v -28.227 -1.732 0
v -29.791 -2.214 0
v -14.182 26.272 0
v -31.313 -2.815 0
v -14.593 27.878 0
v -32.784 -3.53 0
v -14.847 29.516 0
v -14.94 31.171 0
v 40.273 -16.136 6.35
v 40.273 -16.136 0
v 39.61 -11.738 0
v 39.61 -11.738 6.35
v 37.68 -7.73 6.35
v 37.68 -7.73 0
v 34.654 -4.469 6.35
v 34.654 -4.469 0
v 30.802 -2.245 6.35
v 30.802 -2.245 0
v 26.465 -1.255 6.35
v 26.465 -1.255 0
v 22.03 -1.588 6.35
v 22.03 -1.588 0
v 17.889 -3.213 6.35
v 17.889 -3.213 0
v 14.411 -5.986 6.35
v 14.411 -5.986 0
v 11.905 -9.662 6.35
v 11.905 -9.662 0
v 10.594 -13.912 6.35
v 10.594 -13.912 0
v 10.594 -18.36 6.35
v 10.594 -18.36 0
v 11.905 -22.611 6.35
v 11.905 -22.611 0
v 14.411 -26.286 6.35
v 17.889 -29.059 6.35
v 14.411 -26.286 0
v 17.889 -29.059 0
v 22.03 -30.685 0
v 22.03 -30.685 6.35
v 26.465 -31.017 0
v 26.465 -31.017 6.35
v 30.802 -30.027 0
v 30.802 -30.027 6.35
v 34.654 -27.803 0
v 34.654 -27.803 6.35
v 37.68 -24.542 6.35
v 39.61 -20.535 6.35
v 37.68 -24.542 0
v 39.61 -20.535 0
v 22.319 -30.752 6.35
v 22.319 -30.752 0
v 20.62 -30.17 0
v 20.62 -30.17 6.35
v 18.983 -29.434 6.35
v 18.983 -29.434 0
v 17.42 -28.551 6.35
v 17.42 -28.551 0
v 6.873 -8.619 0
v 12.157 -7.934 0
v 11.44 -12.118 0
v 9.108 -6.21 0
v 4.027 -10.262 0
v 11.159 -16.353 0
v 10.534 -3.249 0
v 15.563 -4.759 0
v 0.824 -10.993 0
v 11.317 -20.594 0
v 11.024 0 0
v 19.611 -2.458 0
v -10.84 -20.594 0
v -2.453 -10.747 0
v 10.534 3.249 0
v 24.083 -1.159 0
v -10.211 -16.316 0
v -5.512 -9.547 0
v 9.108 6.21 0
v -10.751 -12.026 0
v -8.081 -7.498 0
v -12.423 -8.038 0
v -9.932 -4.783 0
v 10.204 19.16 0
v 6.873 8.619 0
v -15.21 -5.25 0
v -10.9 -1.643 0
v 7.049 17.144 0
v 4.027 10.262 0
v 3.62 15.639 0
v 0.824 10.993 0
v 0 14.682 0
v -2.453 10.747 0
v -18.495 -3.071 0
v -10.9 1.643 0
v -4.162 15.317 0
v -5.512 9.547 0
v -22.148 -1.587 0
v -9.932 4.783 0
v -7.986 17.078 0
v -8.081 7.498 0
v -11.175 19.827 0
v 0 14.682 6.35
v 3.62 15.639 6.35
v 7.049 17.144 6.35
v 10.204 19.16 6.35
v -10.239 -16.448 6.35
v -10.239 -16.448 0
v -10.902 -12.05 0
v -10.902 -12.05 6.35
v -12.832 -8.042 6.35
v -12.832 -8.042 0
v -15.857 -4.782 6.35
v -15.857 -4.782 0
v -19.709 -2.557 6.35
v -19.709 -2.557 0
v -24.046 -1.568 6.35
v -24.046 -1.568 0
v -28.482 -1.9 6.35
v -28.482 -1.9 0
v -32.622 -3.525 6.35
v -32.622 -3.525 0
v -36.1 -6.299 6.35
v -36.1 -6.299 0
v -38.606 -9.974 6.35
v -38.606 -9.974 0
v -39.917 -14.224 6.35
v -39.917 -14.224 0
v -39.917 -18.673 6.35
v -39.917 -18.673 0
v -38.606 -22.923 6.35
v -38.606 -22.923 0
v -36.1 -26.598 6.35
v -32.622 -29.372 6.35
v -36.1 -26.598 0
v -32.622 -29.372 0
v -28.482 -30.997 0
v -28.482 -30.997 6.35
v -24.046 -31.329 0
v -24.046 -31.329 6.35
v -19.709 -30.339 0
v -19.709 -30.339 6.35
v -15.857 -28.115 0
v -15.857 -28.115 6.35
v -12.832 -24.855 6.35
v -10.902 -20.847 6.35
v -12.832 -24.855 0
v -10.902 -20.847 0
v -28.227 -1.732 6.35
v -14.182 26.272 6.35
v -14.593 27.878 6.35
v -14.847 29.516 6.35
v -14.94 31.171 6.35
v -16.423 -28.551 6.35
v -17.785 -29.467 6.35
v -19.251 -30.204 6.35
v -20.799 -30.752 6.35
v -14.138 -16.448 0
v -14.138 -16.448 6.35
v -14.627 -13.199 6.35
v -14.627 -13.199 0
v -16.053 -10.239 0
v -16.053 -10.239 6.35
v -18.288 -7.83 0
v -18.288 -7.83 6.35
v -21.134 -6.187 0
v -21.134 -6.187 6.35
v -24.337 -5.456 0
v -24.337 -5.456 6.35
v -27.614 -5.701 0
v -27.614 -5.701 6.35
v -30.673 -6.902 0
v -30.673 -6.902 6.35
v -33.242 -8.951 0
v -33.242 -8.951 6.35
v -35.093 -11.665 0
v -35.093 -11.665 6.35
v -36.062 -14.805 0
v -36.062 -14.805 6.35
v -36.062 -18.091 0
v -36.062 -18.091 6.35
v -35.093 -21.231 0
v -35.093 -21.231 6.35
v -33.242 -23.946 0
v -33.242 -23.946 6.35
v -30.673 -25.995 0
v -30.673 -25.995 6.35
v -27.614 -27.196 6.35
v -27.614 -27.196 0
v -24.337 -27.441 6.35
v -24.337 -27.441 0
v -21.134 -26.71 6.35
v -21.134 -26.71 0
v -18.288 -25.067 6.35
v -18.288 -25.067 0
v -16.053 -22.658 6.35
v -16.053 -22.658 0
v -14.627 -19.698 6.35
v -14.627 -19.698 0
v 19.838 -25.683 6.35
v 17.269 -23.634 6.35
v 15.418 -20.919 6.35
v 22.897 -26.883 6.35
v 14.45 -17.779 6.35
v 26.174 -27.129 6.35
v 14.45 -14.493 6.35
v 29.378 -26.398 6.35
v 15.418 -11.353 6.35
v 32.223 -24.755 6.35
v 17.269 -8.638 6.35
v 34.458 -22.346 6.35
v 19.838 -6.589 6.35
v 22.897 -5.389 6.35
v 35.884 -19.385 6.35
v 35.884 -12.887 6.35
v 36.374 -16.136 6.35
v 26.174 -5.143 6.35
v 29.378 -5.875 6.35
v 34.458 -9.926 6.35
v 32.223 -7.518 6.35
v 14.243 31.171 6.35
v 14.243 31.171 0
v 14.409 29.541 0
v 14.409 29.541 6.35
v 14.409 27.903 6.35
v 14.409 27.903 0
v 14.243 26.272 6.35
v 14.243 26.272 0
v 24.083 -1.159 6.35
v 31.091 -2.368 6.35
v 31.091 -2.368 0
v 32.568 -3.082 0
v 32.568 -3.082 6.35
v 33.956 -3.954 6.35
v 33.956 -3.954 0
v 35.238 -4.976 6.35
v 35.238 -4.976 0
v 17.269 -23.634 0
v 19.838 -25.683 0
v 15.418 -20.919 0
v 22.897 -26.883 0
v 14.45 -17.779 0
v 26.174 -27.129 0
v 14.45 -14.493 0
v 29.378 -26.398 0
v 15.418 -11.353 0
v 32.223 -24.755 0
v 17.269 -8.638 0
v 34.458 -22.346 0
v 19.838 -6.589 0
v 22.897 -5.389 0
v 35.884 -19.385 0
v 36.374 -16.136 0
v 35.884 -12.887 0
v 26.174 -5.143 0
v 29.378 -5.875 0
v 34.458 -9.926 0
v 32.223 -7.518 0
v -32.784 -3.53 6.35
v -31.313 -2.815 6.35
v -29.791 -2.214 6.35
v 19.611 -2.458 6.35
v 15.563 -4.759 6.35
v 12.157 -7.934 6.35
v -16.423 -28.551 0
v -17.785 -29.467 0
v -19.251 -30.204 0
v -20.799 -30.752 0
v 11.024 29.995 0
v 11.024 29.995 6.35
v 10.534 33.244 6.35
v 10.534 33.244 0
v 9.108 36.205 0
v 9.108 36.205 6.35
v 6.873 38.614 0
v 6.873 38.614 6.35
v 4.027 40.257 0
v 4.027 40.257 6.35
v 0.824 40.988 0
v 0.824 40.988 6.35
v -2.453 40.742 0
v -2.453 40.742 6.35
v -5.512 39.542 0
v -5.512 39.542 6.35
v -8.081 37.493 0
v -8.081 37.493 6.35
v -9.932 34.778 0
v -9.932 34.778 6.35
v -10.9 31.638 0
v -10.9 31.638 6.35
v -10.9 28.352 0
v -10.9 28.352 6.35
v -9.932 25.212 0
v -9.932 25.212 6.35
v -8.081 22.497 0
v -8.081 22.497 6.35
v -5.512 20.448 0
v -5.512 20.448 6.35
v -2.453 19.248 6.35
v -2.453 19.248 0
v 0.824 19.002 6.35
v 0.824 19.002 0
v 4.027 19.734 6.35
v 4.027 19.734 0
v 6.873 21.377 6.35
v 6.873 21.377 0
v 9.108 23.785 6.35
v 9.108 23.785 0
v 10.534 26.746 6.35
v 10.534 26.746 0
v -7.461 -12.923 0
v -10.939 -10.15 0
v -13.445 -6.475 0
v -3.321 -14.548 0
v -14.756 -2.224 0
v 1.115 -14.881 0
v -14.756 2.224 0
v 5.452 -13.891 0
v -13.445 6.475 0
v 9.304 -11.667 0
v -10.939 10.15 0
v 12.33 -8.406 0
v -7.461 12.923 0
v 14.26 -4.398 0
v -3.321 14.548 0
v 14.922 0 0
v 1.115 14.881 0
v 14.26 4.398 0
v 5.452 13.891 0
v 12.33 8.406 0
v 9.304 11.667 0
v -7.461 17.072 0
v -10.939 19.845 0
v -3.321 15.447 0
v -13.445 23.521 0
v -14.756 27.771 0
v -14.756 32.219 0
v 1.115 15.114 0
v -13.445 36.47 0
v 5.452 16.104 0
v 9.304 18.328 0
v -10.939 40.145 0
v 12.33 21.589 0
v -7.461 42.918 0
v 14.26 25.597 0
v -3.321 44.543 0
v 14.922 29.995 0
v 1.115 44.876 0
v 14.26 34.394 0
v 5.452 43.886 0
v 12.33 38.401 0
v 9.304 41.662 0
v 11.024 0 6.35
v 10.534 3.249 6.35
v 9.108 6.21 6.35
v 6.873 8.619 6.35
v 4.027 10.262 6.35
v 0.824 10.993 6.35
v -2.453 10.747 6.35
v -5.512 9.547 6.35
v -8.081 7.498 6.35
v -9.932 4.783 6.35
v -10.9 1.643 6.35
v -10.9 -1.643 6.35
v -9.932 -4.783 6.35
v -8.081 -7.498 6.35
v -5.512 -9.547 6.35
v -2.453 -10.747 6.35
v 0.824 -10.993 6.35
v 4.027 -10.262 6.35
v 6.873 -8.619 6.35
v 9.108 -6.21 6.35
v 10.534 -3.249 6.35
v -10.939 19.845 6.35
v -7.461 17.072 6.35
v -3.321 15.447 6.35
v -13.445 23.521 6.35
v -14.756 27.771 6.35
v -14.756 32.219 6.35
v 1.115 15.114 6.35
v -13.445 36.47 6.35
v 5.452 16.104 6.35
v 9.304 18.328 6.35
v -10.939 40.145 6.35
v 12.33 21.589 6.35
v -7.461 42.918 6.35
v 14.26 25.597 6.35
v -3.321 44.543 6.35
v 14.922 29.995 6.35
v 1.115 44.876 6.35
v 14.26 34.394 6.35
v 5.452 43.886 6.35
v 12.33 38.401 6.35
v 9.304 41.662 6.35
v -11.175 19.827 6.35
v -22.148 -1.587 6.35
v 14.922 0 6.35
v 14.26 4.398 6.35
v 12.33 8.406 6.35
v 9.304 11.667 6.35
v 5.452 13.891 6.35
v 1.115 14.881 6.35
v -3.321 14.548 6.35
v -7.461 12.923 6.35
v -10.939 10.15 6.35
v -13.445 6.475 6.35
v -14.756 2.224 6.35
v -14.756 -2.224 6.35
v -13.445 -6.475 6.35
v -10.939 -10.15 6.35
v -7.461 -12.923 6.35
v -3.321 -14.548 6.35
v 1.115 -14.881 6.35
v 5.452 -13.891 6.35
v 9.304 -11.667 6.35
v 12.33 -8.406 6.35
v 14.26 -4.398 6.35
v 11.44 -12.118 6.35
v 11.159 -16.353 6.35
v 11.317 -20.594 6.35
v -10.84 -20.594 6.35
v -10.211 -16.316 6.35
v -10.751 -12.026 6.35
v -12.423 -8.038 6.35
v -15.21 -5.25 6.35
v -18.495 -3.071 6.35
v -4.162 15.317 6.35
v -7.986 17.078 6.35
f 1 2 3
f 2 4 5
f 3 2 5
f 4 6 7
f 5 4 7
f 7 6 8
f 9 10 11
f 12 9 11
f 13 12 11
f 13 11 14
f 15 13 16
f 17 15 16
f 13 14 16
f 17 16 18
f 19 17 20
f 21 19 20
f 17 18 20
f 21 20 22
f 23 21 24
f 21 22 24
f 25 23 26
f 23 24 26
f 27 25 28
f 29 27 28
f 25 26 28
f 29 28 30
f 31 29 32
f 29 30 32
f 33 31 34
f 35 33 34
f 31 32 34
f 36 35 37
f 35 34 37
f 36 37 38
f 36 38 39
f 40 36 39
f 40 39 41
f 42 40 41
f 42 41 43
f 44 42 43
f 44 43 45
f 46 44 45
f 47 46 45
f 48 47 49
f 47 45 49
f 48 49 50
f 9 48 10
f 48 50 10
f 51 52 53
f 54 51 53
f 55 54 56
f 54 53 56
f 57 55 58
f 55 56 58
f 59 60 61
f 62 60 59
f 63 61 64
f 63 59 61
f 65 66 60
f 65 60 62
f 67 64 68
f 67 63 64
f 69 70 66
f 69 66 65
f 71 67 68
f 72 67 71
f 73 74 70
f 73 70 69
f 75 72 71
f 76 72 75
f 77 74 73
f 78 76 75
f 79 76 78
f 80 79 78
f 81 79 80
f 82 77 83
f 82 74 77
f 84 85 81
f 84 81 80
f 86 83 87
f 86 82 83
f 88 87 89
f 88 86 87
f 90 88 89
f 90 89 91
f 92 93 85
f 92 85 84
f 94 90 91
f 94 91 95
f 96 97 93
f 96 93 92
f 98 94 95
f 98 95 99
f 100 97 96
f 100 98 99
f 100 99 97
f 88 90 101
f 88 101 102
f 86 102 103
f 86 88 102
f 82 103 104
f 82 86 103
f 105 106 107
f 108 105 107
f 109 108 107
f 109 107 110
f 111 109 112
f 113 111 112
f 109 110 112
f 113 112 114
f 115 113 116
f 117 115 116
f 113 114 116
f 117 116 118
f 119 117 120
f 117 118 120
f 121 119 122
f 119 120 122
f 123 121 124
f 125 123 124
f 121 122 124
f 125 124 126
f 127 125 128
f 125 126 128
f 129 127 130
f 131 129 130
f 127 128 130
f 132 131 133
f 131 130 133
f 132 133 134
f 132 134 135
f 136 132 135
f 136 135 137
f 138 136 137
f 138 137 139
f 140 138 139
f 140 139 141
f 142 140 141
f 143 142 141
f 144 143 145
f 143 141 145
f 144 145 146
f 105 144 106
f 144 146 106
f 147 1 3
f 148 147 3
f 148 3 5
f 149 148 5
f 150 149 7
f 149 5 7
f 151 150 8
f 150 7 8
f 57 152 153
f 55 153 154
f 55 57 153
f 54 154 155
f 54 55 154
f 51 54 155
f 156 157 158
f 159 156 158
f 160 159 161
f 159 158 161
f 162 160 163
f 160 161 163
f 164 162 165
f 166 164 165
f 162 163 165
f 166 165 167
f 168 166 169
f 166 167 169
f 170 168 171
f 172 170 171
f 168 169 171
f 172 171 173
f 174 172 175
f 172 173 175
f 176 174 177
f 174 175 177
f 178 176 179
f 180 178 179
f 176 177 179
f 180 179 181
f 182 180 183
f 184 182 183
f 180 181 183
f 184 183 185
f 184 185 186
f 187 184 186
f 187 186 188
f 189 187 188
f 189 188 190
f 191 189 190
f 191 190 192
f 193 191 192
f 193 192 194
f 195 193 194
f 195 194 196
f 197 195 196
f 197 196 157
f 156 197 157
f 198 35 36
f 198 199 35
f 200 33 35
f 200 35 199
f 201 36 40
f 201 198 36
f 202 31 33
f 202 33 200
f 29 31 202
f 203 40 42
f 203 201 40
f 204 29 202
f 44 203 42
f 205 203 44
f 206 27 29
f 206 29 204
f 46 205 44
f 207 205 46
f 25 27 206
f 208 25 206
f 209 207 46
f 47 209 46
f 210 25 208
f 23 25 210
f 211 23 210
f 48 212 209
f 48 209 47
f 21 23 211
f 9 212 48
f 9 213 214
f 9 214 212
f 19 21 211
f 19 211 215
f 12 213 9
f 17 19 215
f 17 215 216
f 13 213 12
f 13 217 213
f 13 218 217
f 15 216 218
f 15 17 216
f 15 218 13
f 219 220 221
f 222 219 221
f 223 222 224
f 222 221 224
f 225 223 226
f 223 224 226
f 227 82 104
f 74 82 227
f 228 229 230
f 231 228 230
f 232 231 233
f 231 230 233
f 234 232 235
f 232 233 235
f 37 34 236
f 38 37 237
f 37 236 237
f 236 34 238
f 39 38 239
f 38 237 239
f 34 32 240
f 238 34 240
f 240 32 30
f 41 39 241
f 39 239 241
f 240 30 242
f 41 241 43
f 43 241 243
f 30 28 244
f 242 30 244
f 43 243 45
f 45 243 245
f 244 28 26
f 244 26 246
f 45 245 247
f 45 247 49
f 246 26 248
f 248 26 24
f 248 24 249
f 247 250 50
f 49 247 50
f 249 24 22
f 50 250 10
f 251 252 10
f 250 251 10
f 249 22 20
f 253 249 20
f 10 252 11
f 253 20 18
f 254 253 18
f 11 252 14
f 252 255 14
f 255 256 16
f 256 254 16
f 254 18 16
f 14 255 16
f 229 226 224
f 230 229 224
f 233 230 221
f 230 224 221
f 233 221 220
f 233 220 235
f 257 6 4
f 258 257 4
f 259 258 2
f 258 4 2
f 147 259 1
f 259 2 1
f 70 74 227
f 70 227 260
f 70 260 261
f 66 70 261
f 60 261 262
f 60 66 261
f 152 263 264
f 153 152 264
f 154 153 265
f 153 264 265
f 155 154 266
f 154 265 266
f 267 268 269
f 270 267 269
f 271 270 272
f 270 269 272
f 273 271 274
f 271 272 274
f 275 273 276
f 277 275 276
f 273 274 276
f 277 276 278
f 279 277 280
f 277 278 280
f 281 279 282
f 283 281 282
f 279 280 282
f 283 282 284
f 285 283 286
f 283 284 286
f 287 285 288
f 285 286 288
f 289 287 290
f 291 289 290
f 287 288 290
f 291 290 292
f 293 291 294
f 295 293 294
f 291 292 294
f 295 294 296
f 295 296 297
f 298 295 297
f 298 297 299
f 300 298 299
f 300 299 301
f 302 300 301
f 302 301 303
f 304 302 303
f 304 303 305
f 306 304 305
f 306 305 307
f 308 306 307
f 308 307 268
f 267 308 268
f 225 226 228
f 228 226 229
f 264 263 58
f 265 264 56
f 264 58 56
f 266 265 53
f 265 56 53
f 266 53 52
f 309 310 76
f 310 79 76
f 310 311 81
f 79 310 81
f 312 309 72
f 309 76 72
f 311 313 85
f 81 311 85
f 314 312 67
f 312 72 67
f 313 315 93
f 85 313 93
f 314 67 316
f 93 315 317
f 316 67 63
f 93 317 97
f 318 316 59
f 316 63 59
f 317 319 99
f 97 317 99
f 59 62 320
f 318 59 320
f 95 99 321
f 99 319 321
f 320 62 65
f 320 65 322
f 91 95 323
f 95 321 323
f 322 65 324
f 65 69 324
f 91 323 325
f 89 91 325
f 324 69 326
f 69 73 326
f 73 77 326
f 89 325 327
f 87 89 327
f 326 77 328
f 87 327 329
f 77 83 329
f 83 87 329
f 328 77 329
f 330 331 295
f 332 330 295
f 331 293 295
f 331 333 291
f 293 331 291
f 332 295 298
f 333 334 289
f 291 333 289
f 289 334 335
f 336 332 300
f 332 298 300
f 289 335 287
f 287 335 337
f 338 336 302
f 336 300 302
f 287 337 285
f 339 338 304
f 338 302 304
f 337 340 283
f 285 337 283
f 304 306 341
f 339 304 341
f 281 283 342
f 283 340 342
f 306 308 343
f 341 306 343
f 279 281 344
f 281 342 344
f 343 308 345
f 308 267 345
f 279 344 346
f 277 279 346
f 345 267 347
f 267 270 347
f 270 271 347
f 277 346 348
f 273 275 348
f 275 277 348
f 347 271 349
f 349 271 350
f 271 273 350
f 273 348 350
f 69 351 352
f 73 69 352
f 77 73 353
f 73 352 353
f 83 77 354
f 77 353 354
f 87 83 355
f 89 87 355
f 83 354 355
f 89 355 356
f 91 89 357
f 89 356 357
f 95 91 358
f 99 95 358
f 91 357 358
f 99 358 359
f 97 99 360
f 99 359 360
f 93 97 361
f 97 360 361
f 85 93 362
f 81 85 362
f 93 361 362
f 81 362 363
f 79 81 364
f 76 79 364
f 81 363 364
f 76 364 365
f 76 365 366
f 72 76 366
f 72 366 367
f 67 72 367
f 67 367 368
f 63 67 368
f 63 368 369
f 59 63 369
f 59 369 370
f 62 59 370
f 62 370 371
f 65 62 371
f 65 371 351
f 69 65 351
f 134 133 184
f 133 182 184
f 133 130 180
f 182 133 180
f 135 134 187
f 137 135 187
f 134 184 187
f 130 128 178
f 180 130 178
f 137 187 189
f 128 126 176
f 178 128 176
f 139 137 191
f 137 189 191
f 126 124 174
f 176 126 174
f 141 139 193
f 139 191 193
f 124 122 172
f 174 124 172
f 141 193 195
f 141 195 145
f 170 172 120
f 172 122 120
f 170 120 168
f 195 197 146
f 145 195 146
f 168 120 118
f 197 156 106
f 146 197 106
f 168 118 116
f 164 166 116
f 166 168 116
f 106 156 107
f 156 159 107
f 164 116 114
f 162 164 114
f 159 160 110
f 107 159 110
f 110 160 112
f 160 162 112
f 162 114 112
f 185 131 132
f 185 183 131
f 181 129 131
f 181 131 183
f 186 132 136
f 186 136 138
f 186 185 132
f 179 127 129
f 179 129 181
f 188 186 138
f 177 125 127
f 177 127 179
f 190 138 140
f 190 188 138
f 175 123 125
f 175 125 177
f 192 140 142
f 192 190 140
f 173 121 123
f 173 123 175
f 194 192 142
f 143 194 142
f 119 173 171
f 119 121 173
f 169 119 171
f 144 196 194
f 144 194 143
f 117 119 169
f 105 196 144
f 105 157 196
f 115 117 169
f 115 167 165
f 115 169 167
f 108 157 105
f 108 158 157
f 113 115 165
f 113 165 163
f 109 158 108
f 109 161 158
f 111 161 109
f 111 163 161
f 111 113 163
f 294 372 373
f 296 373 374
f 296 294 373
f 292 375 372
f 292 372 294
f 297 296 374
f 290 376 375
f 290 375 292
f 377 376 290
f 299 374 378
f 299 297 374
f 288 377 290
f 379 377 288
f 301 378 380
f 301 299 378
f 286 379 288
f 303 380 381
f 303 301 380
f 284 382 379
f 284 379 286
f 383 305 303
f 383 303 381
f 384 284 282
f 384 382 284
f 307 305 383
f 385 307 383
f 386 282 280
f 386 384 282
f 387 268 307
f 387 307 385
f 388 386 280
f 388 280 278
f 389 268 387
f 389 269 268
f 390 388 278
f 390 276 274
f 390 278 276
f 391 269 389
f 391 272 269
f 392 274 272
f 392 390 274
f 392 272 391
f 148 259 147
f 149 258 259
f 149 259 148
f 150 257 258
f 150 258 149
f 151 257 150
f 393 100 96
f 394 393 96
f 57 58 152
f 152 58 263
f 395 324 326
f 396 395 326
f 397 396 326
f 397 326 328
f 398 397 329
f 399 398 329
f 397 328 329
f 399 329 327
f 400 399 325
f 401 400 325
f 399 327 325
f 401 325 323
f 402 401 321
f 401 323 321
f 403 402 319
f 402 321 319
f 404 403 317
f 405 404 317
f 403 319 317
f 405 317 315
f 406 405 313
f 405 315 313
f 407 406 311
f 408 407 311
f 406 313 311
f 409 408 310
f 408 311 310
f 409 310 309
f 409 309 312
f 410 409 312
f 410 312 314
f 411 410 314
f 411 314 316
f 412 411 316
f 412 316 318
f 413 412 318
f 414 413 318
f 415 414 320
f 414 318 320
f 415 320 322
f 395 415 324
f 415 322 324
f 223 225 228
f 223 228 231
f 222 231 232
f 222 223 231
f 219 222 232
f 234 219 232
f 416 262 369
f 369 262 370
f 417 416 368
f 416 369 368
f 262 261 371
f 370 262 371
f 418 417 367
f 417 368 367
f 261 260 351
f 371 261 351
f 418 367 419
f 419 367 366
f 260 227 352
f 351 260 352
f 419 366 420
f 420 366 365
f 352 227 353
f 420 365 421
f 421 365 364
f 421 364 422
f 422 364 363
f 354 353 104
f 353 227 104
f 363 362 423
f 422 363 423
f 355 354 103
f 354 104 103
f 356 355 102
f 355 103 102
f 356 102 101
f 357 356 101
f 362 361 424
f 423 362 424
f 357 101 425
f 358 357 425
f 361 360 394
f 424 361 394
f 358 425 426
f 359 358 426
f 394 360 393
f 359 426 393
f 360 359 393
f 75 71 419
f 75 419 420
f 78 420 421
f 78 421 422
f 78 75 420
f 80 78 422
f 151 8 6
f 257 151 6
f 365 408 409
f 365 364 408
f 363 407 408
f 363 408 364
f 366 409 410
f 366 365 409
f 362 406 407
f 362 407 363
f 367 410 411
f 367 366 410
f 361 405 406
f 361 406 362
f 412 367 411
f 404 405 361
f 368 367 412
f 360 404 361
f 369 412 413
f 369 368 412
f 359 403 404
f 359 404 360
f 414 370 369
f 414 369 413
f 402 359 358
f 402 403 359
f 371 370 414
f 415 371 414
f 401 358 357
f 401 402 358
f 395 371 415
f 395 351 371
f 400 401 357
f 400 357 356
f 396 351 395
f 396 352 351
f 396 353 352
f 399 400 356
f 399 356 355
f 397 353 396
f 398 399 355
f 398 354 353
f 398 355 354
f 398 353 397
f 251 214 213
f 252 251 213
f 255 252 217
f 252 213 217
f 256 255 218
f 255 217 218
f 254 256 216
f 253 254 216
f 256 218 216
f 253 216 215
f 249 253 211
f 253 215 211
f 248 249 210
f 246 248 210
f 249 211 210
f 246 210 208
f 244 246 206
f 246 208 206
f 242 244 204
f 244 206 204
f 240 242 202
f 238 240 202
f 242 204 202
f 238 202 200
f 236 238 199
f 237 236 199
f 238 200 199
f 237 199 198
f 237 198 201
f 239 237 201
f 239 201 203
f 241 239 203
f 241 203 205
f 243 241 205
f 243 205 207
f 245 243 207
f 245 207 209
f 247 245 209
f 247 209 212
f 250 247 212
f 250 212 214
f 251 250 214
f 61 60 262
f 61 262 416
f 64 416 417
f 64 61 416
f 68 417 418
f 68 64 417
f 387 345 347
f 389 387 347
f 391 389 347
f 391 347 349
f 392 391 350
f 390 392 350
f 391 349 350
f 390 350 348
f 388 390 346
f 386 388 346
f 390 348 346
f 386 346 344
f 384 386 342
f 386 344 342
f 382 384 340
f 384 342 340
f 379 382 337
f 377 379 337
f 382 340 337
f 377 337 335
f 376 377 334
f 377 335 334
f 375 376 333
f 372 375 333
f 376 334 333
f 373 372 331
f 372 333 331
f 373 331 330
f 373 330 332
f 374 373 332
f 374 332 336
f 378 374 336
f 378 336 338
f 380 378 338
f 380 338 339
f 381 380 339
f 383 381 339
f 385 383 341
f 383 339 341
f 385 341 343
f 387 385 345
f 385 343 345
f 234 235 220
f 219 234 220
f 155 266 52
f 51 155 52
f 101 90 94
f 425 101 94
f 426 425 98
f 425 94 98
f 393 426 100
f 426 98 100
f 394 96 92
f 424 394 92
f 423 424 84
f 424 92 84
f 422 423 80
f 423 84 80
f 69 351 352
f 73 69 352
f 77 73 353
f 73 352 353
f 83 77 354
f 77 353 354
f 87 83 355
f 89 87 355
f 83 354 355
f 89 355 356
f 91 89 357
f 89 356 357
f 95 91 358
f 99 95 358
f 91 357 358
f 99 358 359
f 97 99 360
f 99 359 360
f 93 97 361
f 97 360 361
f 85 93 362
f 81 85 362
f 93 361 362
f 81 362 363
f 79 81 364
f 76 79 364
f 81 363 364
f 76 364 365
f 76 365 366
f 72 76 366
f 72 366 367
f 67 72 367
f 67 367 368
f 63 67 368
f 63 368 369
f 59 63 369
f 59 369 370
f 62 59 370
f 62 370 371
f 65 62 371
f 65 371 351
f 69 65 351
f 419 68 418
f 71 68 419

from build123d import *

# Parameters (mm, degrees)
F0_R      = 14.9225
F1_DEPTH  = 6.35
F2_R      = 11.0236
F3_DEPTH  = 25.4
F4_R      = 14.9225
F5_DEPTH  = 6.35
F6_R      = 11.0236
F7_DEPTH  = 25.4
F8_R      = 11.0236
F9_DEPTH  = 25.4
F10_R     = 11.0236
F11_DEPTH = 25.4
F13_DEPTH = 6.35
F15_DEPTH = 6.35
F16_R     = 11.0236
F17_DEPTH = 25.4


with BuildPart() as f1:
    # F0 (on Top) → F1 (new body)
    with BuildSketch(Plane.XY):
        Circle(F0_R)
    extrude(amount=F1_DEPTH)

    # F2 (on face) → F3 (cut)
    with BuildSketch(Plane.XY.offset(6.35)):
        Circle(F2_R)
    extrude(amount=-F3_DEPTH, mode=Mode.SUBTRACT)


with BuildPart() as f5:
    # F4 (on Top) → F5 (new body)
    with BuildSketch(Plane.XY):
        with Locations((0, 29.995130375)):
            Circle(F4_R)
    extrude(amount=F5_DEPTH)

    # F10 (on face) → F11 (cut)
    with BuildSketch(Plane.XY.offset(6.35)):
        with Locations((0, 29.995130375)):
            Circle(F10_R)
    extrude(amount=-F11_DEPTH, mode=Mode.SUBTRACT)


with BuildPart() as f5b:
    # F4 (on Top) → F5, piece 2 (new body)
    with BuildSketch(Plane.XY):
        with Locations((25.3502020365, -16.1362032066)):
            Circle(F4_R)
    extrude(amount=F5_DEPTH)

    # F8 (on face) → F9 (cut)
    with BuildSketch(Plane.XY.offset(6.35)):
        with Locations((25.3502020365, -16.1362032066)):
            Circle(F8_R)
    extrude(amount=-F9_DEPTH, mode=Mode.SUBTRACT)


with BuildPart() as f5c:
    # F4 (on Top) → F5, piece 3 (new body)
    with BuildSketch(Plane.XY):
        with Locations((-25.1612309388, -16.4484566616)):
            Circle(F4_R)
    extrude(amount=F5_DEPTH)

    # F6 (on face) → F7 (cut)
    with BuildSketch(Plane.XY.offset(6.35)):
        with Locations((-25.1612309388, -16.4484566616)):
            Circle(F6_R)
    extrude(amount=-F7_DEPTH, mode=Mode.SUBTRACT)


with BuildPart() as f13:
    # F12 (on Top) → F13 (new body)
    with BuildSketch(Plane.XY):
        with BuildLine():
            ThreePointArc((-14.1815754256, 26.2724870336), (-14.7397710347, 28.6940485386), (-14.9400411174, 31.1710294336))
            Line((-14.9400411174, 31.1710294336), (-32.7839441597, -3.5299733281))
            ThreePointArc((-32.7839441597, -3.5299733281), (-30.5574207478, -2.499721989), (-28.2273480603, -1.7318772152))
            Line((-28.2273480603, -1.7318772152), (-14.1815754256, 26.2724870336))
        make_face()
    extrude(amount=F13_DEPTH)


with BuildPart() as f13b:
    # F12 (on Top) → F13, piece 2 (new body)
    with BuildSketch(Plane.XY):
        with BuildLine():
            ThreePointArc((14.2428381354, 31.1710294336), (14.4295970247, 28.7217582336), (14.2428381354, 26.2724870336))
            Line((14.2428381354, 26.2724870336), (31.0912895948, -2.3684781045))
            ThreePointArc((31.0912895948, -2.3684781045), (33.2739220465, -3.4986218308), (35.2378445914, -4.9764978401))
            Line((35.2378445914, -4.9764978401), (14.2428381354, 31.1710294336))
        make_face()
    extrude(amount=F13_DEPTH)


with BuildPart() as f13c:
    # F12 (on Top) → F13, piece 3 (new body)
    with BuildSketch(Plane.XY):
        with BuildLine():
            ThreePointArc((-16.4225419218, -28.5508202595), (-18.5063560658, -29.8586993828), (-20.7987943693, -30.7517591864))
            Line((-20.7987943693, -30.7517591864), (22.3186481744, -30.7517591864))
            ThreePointArc((22.3186481744, -30.7517591864), (19.7931554786, -29.8209328805), (17.4201057744, -28.5508202595))
            Line((17.4201057744, -28.5508202595), (-16.4225419218, -28.5508202595))
        make_face()
    extrude(amount=F13_DEPTH)


with BuildPart() as f15:
    # F14 (on Top) → F15 (new body)
    with BuildSketch(Plane.XY):
        with BuildLine():
            ThreePointArc((0, 14.6820113793), (5.3636601677, 16.3249040631), (10.2038477654, 19.1604870336))
            Line((10.2038477654, 19.1604870336), (24.0828443311, -1.1592473627))
            ThreePointArc((24.0828443311, -1.1592473627), (17.5196006294, -3.4900052057), (12.157075972, -7.9343194733))
            ThreePointArc((12.157075972, -7.9343194733), (11.2447112538, -14.2314186522), (11.3169401884, -20.5938592553))
            Line((11.3169401884, -20.5938592553), (-10.8404997736, -20.5938592553))
            ThreePointArc((-10.8404997736, -20.5938592553), (-10.3350678261, -14.152459729), (-12.4231744558, -8.0379769206))
            ThreePointArc((-12.4231744558, -8.0379769206), (-13.0543857953, 7.0636248062), (0, 14.6820113793))
        make_face()
        with BuildLine():
            Line((24.0828443311, -1.1592473627), (10.2038477654, 19.1604870336))
            ThreePointArc((10.2038477654, 19.1604870336), (5.3636601677, 16.3249040631), (0, 14.6820113793))
            ThreePointArc((0, 14.6820113793), (12.7613253908, 6.9660800211), (12.157075972, -7.9343194733))
            ThreePointArc((12.157075972, -7.9343194733), (17.5196006294, -3.4900052057), (24.0828443311, -1.1592473627))
        make_face()
        with BuildLine():
            ThreePointArc((12.157075972, -7.9343194733), (12.7613253908, 6.9660800211), (0, 14.6820113793))
            ThreePointArc((0, 14.6820113793), (-6.1357920612, 16.0634784709), (-11.1745101995, 19.8274810037))
            Line((-11.1745101995, 19.8274810037), (-22.1475167638, -1.5871050276))
            ThreePointArc((-22.1475167638, -1.5871050276), (-16.7981998833, -4.0781950009), (-12.4231744558, -8.0379769206))
            ThreePointArc((-12.4231744558, -8.0379769206), (-0.1042111395, -14.8245162682), (12.157075972, -7.9343194733))
        make_face()
        with BuildLine():
            ThreePointArc((0, 14.6820113793), (-13.0543857953, 7.0636248062), (-12.4231744558, -8.0379769206))
            ThreePointArc((-12.4231744558, -8.0379769206), (-16.7981998833, -4.0781950009), (-22.1475167638, -1.5871050276))
            Line((-22.1475167638, -1.5871050276), (-11.1745101995, 19.8274810037))
            ThreePointArc((-11.1745101995, 19.8274810037), (-6.1357920612, 16.0634784709), (0, 14.6820113793))
        make_face(mode=Mode.SUBTRACT)
        with BuildLine():
            ThreePointArc((11.3169401884, -20.5938592553), (11.2447112538, -14.2314186522), (12.157075972, -7.9343194733))
            ThreePointArc((12.157075972, -7.9343194733), (-0.1042111395, -14.8245162682), (-12.4231744558, -8.0379769206))
            ThreePointArc((-12.4231744558, -8.0379769206), (-10.3350678261, -14.152459729), (-10.8404997736, -20.5938592553))
            Line((-10.8404997736, -20.5938592553), (11.3169401884, -20.5938592553))
        make_face()
    extrude(amount=F15_DEPTH)

    # F16 (on face) → F17 (cut)
    with BuildSketch(Plane.XY.offset(6.35)):
        Circle(F16_R)
    extrude(amount=-F17_DEPTH, mode=Mode.SUBTRACT)


solid = Compound([f1.part, f5.part, f5b.part, f5c.part, f13.part, f13b.part, f13c.part, f15.part])
